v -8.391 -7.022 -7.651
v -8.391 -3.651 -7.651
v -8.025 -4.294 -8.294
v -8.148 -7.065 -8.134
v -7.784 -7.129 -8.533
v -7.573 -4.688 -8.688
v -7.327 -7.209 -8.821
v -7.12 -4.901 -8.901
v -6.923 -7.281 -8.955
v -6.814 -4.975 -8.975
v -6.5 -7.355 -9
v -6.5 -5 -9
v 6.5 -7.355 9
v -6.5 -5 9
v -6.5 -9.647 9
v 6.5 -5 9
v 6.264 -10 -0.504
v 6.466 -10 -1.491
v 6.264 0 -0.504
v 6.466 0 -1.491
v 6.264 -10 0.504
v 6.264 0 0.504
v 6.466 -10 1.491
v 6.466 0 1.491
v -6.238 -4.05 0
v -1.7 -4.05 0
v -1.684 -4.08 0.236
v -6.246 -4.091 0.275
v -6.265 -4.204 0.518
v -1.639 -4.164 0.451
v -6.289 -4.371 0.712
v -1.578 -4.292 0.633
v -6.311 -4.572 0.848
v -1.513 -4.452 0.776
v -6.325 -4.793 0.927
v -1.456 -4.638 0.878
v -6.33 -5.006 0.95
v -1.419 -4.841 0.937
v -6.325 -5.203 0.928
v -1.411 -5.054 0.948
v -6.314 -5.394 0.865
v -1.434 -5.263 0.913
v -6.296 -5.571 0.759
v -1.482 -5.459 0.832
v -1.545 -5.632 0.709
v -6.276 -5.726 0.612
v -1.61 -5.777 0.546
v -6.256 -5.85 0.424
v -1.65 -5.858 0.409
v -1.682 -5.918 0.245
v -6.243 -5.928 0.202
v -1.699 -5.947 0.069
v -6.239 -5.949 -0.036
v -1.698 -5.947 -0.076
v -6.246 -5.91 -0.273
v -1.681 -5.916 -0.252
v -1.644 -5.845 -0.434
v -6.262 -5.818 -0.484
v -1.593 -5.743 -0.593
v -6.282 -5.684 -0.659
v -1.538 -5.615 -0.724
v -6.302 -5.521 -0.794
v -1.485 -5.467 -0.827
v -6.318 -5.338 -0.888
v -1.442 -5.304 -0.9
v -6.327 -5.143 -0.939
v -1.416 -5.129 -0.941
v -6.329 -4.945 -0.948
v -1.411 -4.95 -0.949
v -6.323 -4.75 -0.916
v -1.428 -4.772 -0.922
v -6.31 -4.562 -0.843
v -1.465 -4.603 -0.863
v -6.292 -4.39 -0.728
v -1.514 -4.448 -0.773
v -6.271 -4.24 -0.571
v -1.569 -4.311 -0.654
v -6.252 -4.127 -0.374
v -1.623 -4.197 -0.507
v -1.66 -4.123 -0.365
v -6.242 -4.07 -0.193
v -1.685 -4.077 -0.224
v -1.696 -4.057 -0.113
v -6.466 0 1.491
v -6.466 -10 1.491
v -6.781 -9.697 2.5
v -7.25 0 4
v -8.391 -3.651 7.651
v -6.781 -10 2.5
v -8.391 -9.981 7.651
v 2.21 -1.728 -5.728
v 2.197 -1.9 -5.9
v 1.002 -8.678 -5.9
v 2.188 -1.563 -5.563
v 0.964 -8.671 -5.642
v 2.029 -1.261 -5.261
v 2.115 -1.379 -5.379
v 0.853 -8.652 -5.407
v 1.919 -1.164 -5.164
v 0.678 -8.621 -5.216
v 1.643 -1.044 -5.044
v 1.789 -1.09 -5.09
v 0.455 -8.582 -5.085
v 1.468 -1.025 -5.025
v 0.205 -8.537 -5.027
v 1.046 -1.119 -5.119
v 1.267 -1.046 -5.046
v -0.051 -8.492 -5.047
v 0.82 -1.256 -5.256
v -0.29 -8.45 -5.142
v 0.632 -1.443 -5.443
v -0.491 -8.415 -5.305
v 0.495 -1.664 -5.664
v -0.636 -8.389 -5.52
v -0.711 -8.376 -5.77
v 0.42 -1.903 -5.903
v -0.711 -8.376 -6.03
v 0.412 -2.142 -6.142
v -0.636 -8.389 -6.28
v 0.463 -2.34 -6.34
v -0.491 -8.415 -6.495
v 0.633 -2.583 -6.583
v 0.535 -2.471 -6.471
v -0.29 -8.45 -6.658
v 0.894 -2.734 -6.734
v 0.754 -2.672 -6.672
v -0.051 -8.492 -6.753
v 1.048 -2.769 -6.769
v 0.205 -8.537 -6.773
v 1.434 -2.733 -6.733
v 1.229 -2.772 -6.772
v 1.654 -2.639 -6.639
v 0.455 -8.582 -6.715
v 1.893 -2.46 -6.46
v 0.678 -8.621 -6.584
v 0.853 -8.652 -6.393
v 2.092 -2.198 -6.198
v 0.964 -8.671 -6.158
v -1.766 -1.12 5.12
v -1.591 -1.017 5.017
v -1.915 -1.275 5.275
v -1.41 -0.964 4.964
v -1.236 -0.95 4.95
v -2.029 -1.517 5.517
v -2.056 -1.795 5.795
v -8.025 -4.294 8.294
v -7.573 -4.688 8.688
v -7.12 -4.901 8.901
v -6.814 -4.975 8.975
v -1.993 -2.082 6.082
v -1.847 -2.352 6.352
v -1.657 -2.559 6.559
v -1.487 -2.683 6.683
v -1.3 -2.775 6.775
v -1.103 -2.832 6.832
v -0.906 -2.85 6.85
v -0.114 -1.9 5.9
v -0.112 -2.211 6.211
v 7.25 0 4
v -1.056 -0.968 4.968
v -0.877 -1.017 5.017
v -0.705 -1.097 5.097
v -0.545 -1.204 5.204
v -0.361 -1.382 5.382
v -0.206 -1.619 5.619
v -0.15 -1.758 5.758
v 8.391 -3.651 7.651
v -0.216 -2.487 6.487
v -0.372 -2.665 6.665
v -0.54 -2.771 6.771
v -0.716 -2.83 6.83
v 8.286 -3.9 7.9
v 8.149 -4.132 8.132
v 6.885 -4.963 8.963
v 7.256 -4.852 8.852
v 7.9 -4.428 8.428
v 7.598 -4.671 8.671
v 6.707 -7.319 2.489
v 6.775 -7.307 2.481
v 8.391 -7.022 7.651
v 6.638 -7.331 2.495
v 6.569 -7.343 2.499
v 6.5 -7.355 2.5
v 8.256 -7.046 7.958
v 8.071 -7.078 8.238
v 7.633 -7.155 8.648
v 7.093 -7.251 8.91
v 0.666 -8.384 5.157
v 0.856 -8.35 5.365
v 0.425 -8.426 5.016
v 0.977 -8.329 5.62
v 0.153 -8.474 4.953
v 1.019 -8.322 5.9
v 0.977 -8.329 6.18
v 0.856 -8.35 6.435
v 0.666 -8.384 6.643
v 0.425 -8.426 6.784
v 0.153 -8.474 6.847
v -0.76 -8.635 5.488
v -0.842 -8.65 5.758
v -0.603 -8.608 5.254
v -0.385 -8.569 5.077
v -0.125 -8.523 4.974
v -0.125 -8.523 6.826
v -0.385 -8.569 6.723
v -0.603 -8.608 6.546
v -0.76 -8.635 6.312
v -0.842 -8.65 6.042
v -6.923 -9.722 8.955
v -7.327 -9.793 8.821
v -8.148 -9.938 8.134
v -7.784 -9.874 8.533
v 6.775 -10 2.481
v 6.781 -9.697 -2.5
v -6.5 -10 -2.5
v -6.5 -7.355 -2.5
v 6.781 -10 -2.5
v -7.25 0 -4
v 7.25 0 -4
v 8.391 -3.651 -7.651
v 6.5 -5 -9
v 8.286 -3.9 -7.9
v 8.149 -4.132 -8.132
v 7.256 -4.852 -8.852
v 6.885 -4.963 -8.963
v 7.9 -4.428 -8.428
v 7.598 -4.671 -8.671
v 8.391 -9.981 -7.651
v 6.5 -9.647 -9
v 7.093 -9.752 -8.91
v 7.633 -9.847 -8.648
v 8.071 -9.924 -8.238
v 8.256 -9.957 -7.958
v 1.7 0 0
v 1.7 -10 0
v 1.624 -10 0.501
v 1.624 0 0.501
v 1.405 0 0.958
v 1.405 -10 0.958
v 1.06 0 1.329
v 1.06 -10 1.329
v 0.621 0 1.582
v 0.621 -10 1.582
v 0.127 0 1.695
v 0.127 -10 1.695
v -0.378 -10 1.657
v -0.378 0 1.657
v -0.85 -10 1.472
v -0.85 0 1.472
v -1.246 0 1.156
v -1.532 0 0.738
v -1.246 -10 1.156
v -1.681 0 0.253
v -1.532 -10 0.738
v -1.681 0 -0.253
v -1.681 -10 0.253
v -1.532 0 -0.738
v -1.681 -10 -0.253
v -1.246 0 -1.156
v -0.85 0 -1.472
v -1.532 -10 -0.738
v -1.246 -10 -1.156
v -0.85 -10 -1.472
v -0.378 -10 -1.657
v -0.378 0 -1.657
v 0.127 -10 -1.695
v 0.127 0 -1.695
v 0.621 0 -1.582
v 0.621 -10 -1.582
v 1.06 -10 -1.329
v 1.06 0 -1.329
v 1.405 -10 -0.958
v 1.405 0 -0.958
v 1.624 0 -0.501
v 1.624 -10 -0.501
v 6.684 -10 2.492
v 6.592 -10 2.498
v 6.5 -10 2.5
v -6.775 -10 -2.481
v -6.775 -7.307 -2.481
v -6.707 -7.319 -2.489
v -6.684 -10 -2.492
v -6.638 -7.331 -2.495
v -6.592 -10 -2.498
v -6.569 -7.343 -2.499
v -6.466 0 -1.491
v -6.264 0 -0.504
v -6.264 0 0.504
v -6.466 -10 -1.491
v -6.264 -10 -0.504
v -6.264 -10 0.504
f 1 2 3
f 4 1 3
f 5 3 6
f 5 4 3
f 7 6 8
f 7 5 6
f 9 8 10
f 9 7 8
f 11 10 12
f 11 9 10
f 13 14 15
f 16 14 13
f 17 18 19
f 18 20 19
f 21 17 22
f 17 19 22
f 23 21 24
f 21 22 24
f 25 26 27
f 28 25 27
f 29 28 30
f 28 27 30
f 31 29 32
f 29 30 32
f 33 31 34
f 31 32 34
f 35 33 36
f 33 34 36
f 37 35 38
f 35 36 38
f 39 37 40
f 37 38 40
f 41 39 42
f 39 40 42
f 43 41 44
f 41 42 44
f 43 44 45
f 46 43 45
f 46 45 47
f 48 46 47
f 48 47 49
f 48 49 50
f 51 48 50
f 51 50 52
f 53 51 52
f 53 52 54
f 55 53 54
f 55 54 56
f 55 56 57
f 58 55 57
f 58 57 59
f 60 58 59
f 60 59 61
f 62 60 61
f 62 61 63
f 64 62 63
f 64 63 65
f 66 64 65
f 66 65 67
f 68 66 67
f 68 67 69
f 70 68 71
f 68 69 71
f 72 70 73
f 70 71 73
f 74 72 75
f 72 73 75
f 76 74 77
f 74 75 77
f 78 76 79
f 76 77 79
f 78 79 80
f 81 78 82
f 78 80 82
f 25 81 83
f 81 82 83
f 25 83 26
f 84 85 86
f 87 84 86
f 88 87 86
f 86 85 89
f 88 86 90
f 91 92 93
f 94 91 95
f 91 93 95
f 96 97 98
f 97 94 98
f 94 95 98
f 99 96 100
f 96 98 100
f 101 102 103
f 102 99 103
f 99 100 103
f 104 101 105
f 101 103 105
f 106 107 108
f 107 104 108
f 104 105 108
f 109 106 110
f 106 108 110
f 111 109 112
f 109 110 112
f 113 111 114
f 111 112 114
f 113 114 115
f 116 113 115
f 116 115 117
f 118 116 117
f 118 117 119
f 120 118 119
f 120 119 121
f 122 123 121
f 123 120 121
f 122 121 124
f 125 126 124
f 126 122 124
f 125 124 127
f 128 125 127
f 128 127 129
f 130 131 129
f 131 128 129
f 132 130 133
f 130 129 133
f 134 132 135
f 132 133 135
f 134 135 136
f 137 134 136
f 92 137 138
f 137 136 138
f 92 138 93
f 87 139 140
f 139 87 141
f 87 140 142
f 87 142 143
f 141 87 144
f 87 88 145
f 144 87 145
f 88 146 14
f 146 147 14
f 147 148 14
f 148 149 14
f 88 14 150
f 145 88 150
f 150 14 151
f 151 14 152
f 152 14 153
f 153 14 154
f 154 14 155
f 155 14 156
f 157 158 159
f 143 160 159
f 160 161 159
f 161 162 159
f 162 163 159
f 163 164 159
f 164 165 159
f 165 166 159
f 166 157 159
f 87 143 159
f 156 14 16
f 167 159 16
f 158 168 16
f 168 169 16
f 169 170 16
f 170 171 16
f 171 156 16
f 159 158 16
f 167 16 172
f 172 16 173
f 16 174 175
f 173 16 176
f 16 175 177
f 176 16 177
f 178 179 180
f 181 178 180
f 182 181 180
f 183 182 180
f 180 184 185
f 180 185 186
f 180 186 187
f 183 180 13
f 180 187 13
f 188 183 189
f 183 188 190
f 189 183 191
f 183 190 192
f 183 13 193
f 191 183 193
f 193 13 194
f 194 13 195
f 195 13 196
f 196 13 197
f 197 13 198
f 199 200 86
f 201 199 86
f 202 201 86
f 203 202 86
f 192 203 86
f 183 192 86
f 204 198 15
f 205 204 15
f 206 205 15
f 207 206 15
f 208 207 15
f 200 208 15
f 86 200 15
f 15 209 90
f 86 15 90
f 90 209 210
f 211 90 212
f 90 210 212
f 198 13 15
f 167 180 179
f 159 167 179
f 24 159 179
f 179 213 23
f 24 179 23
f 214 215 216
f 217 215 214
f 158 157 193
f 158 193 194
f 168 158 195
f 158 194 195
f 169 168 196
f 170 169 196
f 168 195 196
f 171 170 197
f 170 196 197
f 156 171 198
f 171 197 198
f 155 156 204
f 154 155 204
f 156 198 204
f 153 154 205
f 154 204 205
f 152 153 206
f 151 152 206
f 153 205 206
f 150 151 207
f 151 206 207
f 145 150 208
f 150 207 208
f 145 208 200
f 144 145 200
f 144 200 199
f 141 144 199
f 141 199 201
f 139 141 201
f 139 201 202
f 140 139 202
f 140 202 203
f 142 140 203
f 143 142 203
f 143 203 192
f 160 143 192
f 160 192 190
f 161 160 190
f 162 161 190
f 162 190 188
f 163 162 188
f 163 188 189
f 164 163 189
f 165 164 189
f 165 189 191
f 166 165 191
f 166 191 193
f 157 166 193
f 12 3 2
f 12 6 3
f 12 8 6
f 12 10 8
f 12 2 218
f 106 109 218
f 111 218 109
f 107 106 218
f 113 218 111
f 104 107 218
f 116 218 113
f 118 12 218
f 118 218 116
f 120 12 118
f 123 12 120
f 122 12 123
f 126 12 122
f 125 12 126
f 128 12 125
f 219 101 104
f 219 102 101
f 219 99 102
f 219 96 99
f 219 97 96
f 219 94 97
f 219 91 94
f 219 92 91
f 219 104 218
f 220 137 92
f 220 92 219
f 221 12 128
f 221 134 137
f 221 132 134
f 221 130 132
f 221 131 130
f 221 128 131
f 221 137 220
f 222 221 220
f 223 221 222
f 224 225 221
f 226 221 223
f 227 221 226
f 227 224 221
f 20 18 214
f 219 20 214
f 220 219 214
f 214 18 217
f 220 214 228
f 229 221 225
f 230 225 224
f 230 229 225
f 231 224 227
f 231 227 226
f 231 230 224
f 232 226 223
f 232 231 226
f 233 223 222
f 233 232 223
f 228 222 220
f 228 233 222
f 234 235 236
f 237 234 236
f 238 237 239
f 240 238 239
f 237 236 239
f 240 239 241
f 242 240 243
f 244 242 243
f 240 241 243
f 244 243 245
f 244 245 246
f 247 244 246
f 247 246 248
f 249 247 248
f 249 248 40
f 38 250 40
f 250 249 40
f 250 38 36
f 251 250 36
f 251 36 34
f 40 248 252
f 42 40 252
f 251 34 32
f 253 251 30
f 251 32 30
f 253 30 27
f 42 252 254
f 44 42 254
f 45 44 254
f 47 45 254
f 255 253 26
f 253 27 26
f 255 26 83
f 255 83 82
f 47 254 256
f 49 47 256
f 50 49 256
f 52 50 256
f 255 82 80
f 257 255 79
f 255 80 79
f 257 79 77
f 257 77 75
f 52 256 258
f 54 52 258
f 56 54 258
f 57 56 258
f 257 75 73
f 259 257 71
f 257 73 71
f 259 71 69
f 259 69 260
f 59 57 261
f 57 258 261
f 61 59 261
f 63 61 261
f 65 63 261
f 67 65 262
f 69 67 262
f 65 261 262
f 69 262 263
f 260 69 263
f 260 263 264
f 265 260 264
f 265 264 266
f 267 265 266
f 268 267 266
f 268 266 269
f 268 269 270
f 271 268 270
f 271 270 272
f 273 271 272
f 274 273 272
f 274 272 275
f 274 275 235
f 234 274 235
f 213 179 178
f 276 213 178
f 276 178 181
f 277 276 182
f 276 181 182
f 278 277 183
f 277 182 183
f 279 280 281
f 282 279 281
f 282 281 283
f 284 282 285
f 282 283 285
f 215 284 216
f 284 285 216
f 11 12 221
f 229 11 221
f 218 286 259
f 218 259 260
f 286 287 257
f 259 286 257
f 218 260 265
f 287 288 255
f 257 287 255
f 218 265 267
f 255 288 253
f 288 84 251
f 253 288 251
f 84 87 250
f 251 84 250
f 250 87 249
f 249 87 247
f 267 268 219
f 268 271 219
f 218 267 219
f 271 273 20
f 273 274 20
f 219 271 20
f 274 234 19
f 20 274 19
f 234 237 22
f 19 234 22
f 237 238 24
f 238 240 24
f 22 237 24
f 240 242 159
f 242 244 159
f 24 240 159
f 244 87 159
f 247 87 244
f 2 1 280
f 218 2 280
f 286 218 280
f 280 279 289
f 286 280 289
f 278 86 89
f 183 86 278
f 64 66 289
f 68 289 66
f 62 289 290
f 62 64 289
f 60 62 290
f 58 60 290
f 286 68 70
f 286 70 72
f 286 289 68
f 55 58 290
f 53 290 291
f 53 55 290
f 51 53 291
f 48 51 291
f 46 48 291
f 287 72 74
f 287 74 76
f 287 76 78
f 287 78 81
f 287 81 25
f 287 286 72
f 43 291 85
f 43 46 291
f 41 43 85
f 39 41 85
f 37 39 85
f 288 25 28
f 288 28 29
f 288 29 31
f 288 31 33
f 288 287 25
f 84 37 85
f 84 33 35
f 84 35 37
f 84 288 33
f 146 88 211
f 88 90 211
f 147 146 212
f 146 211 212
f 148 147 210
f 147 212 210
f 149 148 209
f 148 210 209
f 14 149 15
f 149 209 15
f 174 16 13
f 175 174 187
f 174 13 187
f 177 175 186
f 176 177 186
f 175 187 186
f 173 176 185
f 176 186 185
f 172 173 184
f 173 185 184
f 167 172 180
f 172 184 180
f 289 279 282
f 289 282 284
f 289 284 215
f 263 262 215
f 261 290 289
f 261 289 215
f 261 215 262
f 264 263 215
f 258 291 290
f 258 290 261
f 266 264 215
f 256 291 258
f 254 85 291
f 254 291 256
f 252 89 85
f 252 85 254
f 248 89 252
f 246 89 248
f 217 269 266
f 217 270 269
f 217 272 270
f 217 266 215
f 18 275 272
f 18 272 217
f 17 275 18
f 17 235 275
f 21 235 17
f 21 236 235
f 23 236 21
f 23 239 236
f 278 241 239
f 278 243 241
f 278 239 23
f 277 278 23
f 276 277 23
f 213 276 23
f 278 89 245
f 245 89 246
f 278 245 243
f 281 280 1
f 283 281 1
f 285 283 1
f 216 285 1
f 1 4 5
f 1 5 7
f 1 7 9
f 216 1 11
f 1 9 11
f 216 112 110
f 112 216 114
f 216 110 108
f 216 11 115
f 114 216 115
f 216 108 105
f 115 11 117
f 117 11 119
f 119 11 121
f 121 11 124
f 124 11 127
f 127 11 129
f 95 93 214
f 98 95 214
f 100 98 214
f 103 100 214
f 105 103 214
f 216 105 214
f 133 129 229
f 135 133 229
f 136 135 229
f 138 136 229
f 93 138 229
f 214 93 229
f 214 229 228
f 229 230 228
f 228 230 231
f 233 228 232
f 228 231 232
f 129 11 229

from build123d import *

# Parameters (mm, degrees)
F0_W      = 17
F0_H      = 18
F1_DEPTH  = 10
F2_R      = 1.7
F3_DEPTH  = 25
F5_DEPTH  = 6.5
F7_DEPTH  = 6.5
F8_SIZE   = 5
F9_R      = 2
F11_DEPTH = 25
F12_R     = 5
F13_R     = 0.95
F14_DEPTH = 25
F15_R     = 0.875
F16_DEPTH = 25
F17_R     = 0.95
F18_DEPTH = 25


# Not quite as in the source:
# - a feature names something its author has since deleted; it is built from what else it names


with BuildPart() as f1:
    # F0 (on Front) → F1 (new body)
    with BuildSketch(Plane.XZ):
        Rectangle(F0_W, F0_H)
    extrude(amount=F1_DEPTH)

    # F2 (on face) → F3 (cut)
    with BuildSketch(Plane.XZ.offset(10)):
        Circle(F2_R)
    extrude(amount=-F3_DEPTH, mode=Mode.SUBTRACT)

    # F4 (on face) → F5 (cut)
    with BuildSketch(Plane(origin=(0, 0, -9), x_dir=(1, 0, 0), z_dir=(0, 0, -1))):
        Polygon((8.5, 10), (-8.5, 10), (-8.5, 7.002441328), align=None)
    extrude(amount=-F5_DEPTH, mode=Mode.SUBTRACT)

    # F6 (on face) → F7 (cut)
    with BuildSketch(Plane.XY.offset(9)):
        Polygon((8.5, -7.002441328), (-8.5, -10), (8.5, -10), align=None)
    extrude(amount=-F7_DEPTH, mode=Mode.SUBTRACT)

    # F8
    f8_edges = [f1.edges().sort_by_distance(p)[0] for p in [
        (0, 0, 9),
        (0, 0, -9),
    ]]
    chamfer(f8_edges, length=F8_SIZE)

    # F9
    f9_edges = [f1.edges().sort_by_distance(p)[0] for p in [
        (8.5, -8.501221, 2.5),
        (-8.5, -8.501221, -2.5),
        (8.5, -7.5, -9),
        (-8.5, -6.001221, -9),
        (8.5, -6.001221, 9),
        (-8.5, -7.5, 9),
    ]]
    fillet(f9_edges, radius=F9_R)

    # F10 (on face) → F11 (cut)
    with BuildSketch(Plane.XZ.offset(10)):
        Polygon((-8.5, -8), (-6, 0), (-8.5, 8), align=None)
        Polygon((8.5, -8), (8.5, 8), (6, 0), align=None)
    extrude(amount=-F11_DEPTH, mode=Mode.SUBTRACT)

    # F12
    f12_edges = [f1.edges().sort_by_distance(p)[0] for p in [
        (-6, -5, 0),
        (6, -5, 0),
    ]]
    fillet(f12_edges, radius=F12_R)

    # F13 (on face) → F14 (cut)
    with BuildSketch(Plane(origin=(1.453794355, -8.2448774948, 0), x_dir=(0.984807753, 0.1736481777, 0), z_dir=(0.1736481777, -0.984807753, 0))):
        with Locations((-1.3918819604, 5.9)):
            Circle(F13_R)
    extrude(amount=-F14_DEPTH, mode=Mode.SUBTRACT)

    # F15 (on face) → F16 (cut)
    with BuildSketch(Plane(origin=(-1.453794355, -8.2448774948, 0), x_dir=(0.984807753, -0.1736481777, 0), z_dir=(-0.1736481777, -0.984807753, 0))):
        with Locations((1.6190158435, -5.9)):
            Circle(F15_R)
    extrude(amount=-F16_DEPTH, mode=Mode.SUBTRACT)

    # F17 (on Right) → F18 (cut)
    with BuildSketch(Plane.YZ):
        with Locations((-5, 0)):
            Circle(F17_R)
    extrude(amount=-F18_DEPTH, mode=Mode.SUBTRACT)


solid = f1.part
